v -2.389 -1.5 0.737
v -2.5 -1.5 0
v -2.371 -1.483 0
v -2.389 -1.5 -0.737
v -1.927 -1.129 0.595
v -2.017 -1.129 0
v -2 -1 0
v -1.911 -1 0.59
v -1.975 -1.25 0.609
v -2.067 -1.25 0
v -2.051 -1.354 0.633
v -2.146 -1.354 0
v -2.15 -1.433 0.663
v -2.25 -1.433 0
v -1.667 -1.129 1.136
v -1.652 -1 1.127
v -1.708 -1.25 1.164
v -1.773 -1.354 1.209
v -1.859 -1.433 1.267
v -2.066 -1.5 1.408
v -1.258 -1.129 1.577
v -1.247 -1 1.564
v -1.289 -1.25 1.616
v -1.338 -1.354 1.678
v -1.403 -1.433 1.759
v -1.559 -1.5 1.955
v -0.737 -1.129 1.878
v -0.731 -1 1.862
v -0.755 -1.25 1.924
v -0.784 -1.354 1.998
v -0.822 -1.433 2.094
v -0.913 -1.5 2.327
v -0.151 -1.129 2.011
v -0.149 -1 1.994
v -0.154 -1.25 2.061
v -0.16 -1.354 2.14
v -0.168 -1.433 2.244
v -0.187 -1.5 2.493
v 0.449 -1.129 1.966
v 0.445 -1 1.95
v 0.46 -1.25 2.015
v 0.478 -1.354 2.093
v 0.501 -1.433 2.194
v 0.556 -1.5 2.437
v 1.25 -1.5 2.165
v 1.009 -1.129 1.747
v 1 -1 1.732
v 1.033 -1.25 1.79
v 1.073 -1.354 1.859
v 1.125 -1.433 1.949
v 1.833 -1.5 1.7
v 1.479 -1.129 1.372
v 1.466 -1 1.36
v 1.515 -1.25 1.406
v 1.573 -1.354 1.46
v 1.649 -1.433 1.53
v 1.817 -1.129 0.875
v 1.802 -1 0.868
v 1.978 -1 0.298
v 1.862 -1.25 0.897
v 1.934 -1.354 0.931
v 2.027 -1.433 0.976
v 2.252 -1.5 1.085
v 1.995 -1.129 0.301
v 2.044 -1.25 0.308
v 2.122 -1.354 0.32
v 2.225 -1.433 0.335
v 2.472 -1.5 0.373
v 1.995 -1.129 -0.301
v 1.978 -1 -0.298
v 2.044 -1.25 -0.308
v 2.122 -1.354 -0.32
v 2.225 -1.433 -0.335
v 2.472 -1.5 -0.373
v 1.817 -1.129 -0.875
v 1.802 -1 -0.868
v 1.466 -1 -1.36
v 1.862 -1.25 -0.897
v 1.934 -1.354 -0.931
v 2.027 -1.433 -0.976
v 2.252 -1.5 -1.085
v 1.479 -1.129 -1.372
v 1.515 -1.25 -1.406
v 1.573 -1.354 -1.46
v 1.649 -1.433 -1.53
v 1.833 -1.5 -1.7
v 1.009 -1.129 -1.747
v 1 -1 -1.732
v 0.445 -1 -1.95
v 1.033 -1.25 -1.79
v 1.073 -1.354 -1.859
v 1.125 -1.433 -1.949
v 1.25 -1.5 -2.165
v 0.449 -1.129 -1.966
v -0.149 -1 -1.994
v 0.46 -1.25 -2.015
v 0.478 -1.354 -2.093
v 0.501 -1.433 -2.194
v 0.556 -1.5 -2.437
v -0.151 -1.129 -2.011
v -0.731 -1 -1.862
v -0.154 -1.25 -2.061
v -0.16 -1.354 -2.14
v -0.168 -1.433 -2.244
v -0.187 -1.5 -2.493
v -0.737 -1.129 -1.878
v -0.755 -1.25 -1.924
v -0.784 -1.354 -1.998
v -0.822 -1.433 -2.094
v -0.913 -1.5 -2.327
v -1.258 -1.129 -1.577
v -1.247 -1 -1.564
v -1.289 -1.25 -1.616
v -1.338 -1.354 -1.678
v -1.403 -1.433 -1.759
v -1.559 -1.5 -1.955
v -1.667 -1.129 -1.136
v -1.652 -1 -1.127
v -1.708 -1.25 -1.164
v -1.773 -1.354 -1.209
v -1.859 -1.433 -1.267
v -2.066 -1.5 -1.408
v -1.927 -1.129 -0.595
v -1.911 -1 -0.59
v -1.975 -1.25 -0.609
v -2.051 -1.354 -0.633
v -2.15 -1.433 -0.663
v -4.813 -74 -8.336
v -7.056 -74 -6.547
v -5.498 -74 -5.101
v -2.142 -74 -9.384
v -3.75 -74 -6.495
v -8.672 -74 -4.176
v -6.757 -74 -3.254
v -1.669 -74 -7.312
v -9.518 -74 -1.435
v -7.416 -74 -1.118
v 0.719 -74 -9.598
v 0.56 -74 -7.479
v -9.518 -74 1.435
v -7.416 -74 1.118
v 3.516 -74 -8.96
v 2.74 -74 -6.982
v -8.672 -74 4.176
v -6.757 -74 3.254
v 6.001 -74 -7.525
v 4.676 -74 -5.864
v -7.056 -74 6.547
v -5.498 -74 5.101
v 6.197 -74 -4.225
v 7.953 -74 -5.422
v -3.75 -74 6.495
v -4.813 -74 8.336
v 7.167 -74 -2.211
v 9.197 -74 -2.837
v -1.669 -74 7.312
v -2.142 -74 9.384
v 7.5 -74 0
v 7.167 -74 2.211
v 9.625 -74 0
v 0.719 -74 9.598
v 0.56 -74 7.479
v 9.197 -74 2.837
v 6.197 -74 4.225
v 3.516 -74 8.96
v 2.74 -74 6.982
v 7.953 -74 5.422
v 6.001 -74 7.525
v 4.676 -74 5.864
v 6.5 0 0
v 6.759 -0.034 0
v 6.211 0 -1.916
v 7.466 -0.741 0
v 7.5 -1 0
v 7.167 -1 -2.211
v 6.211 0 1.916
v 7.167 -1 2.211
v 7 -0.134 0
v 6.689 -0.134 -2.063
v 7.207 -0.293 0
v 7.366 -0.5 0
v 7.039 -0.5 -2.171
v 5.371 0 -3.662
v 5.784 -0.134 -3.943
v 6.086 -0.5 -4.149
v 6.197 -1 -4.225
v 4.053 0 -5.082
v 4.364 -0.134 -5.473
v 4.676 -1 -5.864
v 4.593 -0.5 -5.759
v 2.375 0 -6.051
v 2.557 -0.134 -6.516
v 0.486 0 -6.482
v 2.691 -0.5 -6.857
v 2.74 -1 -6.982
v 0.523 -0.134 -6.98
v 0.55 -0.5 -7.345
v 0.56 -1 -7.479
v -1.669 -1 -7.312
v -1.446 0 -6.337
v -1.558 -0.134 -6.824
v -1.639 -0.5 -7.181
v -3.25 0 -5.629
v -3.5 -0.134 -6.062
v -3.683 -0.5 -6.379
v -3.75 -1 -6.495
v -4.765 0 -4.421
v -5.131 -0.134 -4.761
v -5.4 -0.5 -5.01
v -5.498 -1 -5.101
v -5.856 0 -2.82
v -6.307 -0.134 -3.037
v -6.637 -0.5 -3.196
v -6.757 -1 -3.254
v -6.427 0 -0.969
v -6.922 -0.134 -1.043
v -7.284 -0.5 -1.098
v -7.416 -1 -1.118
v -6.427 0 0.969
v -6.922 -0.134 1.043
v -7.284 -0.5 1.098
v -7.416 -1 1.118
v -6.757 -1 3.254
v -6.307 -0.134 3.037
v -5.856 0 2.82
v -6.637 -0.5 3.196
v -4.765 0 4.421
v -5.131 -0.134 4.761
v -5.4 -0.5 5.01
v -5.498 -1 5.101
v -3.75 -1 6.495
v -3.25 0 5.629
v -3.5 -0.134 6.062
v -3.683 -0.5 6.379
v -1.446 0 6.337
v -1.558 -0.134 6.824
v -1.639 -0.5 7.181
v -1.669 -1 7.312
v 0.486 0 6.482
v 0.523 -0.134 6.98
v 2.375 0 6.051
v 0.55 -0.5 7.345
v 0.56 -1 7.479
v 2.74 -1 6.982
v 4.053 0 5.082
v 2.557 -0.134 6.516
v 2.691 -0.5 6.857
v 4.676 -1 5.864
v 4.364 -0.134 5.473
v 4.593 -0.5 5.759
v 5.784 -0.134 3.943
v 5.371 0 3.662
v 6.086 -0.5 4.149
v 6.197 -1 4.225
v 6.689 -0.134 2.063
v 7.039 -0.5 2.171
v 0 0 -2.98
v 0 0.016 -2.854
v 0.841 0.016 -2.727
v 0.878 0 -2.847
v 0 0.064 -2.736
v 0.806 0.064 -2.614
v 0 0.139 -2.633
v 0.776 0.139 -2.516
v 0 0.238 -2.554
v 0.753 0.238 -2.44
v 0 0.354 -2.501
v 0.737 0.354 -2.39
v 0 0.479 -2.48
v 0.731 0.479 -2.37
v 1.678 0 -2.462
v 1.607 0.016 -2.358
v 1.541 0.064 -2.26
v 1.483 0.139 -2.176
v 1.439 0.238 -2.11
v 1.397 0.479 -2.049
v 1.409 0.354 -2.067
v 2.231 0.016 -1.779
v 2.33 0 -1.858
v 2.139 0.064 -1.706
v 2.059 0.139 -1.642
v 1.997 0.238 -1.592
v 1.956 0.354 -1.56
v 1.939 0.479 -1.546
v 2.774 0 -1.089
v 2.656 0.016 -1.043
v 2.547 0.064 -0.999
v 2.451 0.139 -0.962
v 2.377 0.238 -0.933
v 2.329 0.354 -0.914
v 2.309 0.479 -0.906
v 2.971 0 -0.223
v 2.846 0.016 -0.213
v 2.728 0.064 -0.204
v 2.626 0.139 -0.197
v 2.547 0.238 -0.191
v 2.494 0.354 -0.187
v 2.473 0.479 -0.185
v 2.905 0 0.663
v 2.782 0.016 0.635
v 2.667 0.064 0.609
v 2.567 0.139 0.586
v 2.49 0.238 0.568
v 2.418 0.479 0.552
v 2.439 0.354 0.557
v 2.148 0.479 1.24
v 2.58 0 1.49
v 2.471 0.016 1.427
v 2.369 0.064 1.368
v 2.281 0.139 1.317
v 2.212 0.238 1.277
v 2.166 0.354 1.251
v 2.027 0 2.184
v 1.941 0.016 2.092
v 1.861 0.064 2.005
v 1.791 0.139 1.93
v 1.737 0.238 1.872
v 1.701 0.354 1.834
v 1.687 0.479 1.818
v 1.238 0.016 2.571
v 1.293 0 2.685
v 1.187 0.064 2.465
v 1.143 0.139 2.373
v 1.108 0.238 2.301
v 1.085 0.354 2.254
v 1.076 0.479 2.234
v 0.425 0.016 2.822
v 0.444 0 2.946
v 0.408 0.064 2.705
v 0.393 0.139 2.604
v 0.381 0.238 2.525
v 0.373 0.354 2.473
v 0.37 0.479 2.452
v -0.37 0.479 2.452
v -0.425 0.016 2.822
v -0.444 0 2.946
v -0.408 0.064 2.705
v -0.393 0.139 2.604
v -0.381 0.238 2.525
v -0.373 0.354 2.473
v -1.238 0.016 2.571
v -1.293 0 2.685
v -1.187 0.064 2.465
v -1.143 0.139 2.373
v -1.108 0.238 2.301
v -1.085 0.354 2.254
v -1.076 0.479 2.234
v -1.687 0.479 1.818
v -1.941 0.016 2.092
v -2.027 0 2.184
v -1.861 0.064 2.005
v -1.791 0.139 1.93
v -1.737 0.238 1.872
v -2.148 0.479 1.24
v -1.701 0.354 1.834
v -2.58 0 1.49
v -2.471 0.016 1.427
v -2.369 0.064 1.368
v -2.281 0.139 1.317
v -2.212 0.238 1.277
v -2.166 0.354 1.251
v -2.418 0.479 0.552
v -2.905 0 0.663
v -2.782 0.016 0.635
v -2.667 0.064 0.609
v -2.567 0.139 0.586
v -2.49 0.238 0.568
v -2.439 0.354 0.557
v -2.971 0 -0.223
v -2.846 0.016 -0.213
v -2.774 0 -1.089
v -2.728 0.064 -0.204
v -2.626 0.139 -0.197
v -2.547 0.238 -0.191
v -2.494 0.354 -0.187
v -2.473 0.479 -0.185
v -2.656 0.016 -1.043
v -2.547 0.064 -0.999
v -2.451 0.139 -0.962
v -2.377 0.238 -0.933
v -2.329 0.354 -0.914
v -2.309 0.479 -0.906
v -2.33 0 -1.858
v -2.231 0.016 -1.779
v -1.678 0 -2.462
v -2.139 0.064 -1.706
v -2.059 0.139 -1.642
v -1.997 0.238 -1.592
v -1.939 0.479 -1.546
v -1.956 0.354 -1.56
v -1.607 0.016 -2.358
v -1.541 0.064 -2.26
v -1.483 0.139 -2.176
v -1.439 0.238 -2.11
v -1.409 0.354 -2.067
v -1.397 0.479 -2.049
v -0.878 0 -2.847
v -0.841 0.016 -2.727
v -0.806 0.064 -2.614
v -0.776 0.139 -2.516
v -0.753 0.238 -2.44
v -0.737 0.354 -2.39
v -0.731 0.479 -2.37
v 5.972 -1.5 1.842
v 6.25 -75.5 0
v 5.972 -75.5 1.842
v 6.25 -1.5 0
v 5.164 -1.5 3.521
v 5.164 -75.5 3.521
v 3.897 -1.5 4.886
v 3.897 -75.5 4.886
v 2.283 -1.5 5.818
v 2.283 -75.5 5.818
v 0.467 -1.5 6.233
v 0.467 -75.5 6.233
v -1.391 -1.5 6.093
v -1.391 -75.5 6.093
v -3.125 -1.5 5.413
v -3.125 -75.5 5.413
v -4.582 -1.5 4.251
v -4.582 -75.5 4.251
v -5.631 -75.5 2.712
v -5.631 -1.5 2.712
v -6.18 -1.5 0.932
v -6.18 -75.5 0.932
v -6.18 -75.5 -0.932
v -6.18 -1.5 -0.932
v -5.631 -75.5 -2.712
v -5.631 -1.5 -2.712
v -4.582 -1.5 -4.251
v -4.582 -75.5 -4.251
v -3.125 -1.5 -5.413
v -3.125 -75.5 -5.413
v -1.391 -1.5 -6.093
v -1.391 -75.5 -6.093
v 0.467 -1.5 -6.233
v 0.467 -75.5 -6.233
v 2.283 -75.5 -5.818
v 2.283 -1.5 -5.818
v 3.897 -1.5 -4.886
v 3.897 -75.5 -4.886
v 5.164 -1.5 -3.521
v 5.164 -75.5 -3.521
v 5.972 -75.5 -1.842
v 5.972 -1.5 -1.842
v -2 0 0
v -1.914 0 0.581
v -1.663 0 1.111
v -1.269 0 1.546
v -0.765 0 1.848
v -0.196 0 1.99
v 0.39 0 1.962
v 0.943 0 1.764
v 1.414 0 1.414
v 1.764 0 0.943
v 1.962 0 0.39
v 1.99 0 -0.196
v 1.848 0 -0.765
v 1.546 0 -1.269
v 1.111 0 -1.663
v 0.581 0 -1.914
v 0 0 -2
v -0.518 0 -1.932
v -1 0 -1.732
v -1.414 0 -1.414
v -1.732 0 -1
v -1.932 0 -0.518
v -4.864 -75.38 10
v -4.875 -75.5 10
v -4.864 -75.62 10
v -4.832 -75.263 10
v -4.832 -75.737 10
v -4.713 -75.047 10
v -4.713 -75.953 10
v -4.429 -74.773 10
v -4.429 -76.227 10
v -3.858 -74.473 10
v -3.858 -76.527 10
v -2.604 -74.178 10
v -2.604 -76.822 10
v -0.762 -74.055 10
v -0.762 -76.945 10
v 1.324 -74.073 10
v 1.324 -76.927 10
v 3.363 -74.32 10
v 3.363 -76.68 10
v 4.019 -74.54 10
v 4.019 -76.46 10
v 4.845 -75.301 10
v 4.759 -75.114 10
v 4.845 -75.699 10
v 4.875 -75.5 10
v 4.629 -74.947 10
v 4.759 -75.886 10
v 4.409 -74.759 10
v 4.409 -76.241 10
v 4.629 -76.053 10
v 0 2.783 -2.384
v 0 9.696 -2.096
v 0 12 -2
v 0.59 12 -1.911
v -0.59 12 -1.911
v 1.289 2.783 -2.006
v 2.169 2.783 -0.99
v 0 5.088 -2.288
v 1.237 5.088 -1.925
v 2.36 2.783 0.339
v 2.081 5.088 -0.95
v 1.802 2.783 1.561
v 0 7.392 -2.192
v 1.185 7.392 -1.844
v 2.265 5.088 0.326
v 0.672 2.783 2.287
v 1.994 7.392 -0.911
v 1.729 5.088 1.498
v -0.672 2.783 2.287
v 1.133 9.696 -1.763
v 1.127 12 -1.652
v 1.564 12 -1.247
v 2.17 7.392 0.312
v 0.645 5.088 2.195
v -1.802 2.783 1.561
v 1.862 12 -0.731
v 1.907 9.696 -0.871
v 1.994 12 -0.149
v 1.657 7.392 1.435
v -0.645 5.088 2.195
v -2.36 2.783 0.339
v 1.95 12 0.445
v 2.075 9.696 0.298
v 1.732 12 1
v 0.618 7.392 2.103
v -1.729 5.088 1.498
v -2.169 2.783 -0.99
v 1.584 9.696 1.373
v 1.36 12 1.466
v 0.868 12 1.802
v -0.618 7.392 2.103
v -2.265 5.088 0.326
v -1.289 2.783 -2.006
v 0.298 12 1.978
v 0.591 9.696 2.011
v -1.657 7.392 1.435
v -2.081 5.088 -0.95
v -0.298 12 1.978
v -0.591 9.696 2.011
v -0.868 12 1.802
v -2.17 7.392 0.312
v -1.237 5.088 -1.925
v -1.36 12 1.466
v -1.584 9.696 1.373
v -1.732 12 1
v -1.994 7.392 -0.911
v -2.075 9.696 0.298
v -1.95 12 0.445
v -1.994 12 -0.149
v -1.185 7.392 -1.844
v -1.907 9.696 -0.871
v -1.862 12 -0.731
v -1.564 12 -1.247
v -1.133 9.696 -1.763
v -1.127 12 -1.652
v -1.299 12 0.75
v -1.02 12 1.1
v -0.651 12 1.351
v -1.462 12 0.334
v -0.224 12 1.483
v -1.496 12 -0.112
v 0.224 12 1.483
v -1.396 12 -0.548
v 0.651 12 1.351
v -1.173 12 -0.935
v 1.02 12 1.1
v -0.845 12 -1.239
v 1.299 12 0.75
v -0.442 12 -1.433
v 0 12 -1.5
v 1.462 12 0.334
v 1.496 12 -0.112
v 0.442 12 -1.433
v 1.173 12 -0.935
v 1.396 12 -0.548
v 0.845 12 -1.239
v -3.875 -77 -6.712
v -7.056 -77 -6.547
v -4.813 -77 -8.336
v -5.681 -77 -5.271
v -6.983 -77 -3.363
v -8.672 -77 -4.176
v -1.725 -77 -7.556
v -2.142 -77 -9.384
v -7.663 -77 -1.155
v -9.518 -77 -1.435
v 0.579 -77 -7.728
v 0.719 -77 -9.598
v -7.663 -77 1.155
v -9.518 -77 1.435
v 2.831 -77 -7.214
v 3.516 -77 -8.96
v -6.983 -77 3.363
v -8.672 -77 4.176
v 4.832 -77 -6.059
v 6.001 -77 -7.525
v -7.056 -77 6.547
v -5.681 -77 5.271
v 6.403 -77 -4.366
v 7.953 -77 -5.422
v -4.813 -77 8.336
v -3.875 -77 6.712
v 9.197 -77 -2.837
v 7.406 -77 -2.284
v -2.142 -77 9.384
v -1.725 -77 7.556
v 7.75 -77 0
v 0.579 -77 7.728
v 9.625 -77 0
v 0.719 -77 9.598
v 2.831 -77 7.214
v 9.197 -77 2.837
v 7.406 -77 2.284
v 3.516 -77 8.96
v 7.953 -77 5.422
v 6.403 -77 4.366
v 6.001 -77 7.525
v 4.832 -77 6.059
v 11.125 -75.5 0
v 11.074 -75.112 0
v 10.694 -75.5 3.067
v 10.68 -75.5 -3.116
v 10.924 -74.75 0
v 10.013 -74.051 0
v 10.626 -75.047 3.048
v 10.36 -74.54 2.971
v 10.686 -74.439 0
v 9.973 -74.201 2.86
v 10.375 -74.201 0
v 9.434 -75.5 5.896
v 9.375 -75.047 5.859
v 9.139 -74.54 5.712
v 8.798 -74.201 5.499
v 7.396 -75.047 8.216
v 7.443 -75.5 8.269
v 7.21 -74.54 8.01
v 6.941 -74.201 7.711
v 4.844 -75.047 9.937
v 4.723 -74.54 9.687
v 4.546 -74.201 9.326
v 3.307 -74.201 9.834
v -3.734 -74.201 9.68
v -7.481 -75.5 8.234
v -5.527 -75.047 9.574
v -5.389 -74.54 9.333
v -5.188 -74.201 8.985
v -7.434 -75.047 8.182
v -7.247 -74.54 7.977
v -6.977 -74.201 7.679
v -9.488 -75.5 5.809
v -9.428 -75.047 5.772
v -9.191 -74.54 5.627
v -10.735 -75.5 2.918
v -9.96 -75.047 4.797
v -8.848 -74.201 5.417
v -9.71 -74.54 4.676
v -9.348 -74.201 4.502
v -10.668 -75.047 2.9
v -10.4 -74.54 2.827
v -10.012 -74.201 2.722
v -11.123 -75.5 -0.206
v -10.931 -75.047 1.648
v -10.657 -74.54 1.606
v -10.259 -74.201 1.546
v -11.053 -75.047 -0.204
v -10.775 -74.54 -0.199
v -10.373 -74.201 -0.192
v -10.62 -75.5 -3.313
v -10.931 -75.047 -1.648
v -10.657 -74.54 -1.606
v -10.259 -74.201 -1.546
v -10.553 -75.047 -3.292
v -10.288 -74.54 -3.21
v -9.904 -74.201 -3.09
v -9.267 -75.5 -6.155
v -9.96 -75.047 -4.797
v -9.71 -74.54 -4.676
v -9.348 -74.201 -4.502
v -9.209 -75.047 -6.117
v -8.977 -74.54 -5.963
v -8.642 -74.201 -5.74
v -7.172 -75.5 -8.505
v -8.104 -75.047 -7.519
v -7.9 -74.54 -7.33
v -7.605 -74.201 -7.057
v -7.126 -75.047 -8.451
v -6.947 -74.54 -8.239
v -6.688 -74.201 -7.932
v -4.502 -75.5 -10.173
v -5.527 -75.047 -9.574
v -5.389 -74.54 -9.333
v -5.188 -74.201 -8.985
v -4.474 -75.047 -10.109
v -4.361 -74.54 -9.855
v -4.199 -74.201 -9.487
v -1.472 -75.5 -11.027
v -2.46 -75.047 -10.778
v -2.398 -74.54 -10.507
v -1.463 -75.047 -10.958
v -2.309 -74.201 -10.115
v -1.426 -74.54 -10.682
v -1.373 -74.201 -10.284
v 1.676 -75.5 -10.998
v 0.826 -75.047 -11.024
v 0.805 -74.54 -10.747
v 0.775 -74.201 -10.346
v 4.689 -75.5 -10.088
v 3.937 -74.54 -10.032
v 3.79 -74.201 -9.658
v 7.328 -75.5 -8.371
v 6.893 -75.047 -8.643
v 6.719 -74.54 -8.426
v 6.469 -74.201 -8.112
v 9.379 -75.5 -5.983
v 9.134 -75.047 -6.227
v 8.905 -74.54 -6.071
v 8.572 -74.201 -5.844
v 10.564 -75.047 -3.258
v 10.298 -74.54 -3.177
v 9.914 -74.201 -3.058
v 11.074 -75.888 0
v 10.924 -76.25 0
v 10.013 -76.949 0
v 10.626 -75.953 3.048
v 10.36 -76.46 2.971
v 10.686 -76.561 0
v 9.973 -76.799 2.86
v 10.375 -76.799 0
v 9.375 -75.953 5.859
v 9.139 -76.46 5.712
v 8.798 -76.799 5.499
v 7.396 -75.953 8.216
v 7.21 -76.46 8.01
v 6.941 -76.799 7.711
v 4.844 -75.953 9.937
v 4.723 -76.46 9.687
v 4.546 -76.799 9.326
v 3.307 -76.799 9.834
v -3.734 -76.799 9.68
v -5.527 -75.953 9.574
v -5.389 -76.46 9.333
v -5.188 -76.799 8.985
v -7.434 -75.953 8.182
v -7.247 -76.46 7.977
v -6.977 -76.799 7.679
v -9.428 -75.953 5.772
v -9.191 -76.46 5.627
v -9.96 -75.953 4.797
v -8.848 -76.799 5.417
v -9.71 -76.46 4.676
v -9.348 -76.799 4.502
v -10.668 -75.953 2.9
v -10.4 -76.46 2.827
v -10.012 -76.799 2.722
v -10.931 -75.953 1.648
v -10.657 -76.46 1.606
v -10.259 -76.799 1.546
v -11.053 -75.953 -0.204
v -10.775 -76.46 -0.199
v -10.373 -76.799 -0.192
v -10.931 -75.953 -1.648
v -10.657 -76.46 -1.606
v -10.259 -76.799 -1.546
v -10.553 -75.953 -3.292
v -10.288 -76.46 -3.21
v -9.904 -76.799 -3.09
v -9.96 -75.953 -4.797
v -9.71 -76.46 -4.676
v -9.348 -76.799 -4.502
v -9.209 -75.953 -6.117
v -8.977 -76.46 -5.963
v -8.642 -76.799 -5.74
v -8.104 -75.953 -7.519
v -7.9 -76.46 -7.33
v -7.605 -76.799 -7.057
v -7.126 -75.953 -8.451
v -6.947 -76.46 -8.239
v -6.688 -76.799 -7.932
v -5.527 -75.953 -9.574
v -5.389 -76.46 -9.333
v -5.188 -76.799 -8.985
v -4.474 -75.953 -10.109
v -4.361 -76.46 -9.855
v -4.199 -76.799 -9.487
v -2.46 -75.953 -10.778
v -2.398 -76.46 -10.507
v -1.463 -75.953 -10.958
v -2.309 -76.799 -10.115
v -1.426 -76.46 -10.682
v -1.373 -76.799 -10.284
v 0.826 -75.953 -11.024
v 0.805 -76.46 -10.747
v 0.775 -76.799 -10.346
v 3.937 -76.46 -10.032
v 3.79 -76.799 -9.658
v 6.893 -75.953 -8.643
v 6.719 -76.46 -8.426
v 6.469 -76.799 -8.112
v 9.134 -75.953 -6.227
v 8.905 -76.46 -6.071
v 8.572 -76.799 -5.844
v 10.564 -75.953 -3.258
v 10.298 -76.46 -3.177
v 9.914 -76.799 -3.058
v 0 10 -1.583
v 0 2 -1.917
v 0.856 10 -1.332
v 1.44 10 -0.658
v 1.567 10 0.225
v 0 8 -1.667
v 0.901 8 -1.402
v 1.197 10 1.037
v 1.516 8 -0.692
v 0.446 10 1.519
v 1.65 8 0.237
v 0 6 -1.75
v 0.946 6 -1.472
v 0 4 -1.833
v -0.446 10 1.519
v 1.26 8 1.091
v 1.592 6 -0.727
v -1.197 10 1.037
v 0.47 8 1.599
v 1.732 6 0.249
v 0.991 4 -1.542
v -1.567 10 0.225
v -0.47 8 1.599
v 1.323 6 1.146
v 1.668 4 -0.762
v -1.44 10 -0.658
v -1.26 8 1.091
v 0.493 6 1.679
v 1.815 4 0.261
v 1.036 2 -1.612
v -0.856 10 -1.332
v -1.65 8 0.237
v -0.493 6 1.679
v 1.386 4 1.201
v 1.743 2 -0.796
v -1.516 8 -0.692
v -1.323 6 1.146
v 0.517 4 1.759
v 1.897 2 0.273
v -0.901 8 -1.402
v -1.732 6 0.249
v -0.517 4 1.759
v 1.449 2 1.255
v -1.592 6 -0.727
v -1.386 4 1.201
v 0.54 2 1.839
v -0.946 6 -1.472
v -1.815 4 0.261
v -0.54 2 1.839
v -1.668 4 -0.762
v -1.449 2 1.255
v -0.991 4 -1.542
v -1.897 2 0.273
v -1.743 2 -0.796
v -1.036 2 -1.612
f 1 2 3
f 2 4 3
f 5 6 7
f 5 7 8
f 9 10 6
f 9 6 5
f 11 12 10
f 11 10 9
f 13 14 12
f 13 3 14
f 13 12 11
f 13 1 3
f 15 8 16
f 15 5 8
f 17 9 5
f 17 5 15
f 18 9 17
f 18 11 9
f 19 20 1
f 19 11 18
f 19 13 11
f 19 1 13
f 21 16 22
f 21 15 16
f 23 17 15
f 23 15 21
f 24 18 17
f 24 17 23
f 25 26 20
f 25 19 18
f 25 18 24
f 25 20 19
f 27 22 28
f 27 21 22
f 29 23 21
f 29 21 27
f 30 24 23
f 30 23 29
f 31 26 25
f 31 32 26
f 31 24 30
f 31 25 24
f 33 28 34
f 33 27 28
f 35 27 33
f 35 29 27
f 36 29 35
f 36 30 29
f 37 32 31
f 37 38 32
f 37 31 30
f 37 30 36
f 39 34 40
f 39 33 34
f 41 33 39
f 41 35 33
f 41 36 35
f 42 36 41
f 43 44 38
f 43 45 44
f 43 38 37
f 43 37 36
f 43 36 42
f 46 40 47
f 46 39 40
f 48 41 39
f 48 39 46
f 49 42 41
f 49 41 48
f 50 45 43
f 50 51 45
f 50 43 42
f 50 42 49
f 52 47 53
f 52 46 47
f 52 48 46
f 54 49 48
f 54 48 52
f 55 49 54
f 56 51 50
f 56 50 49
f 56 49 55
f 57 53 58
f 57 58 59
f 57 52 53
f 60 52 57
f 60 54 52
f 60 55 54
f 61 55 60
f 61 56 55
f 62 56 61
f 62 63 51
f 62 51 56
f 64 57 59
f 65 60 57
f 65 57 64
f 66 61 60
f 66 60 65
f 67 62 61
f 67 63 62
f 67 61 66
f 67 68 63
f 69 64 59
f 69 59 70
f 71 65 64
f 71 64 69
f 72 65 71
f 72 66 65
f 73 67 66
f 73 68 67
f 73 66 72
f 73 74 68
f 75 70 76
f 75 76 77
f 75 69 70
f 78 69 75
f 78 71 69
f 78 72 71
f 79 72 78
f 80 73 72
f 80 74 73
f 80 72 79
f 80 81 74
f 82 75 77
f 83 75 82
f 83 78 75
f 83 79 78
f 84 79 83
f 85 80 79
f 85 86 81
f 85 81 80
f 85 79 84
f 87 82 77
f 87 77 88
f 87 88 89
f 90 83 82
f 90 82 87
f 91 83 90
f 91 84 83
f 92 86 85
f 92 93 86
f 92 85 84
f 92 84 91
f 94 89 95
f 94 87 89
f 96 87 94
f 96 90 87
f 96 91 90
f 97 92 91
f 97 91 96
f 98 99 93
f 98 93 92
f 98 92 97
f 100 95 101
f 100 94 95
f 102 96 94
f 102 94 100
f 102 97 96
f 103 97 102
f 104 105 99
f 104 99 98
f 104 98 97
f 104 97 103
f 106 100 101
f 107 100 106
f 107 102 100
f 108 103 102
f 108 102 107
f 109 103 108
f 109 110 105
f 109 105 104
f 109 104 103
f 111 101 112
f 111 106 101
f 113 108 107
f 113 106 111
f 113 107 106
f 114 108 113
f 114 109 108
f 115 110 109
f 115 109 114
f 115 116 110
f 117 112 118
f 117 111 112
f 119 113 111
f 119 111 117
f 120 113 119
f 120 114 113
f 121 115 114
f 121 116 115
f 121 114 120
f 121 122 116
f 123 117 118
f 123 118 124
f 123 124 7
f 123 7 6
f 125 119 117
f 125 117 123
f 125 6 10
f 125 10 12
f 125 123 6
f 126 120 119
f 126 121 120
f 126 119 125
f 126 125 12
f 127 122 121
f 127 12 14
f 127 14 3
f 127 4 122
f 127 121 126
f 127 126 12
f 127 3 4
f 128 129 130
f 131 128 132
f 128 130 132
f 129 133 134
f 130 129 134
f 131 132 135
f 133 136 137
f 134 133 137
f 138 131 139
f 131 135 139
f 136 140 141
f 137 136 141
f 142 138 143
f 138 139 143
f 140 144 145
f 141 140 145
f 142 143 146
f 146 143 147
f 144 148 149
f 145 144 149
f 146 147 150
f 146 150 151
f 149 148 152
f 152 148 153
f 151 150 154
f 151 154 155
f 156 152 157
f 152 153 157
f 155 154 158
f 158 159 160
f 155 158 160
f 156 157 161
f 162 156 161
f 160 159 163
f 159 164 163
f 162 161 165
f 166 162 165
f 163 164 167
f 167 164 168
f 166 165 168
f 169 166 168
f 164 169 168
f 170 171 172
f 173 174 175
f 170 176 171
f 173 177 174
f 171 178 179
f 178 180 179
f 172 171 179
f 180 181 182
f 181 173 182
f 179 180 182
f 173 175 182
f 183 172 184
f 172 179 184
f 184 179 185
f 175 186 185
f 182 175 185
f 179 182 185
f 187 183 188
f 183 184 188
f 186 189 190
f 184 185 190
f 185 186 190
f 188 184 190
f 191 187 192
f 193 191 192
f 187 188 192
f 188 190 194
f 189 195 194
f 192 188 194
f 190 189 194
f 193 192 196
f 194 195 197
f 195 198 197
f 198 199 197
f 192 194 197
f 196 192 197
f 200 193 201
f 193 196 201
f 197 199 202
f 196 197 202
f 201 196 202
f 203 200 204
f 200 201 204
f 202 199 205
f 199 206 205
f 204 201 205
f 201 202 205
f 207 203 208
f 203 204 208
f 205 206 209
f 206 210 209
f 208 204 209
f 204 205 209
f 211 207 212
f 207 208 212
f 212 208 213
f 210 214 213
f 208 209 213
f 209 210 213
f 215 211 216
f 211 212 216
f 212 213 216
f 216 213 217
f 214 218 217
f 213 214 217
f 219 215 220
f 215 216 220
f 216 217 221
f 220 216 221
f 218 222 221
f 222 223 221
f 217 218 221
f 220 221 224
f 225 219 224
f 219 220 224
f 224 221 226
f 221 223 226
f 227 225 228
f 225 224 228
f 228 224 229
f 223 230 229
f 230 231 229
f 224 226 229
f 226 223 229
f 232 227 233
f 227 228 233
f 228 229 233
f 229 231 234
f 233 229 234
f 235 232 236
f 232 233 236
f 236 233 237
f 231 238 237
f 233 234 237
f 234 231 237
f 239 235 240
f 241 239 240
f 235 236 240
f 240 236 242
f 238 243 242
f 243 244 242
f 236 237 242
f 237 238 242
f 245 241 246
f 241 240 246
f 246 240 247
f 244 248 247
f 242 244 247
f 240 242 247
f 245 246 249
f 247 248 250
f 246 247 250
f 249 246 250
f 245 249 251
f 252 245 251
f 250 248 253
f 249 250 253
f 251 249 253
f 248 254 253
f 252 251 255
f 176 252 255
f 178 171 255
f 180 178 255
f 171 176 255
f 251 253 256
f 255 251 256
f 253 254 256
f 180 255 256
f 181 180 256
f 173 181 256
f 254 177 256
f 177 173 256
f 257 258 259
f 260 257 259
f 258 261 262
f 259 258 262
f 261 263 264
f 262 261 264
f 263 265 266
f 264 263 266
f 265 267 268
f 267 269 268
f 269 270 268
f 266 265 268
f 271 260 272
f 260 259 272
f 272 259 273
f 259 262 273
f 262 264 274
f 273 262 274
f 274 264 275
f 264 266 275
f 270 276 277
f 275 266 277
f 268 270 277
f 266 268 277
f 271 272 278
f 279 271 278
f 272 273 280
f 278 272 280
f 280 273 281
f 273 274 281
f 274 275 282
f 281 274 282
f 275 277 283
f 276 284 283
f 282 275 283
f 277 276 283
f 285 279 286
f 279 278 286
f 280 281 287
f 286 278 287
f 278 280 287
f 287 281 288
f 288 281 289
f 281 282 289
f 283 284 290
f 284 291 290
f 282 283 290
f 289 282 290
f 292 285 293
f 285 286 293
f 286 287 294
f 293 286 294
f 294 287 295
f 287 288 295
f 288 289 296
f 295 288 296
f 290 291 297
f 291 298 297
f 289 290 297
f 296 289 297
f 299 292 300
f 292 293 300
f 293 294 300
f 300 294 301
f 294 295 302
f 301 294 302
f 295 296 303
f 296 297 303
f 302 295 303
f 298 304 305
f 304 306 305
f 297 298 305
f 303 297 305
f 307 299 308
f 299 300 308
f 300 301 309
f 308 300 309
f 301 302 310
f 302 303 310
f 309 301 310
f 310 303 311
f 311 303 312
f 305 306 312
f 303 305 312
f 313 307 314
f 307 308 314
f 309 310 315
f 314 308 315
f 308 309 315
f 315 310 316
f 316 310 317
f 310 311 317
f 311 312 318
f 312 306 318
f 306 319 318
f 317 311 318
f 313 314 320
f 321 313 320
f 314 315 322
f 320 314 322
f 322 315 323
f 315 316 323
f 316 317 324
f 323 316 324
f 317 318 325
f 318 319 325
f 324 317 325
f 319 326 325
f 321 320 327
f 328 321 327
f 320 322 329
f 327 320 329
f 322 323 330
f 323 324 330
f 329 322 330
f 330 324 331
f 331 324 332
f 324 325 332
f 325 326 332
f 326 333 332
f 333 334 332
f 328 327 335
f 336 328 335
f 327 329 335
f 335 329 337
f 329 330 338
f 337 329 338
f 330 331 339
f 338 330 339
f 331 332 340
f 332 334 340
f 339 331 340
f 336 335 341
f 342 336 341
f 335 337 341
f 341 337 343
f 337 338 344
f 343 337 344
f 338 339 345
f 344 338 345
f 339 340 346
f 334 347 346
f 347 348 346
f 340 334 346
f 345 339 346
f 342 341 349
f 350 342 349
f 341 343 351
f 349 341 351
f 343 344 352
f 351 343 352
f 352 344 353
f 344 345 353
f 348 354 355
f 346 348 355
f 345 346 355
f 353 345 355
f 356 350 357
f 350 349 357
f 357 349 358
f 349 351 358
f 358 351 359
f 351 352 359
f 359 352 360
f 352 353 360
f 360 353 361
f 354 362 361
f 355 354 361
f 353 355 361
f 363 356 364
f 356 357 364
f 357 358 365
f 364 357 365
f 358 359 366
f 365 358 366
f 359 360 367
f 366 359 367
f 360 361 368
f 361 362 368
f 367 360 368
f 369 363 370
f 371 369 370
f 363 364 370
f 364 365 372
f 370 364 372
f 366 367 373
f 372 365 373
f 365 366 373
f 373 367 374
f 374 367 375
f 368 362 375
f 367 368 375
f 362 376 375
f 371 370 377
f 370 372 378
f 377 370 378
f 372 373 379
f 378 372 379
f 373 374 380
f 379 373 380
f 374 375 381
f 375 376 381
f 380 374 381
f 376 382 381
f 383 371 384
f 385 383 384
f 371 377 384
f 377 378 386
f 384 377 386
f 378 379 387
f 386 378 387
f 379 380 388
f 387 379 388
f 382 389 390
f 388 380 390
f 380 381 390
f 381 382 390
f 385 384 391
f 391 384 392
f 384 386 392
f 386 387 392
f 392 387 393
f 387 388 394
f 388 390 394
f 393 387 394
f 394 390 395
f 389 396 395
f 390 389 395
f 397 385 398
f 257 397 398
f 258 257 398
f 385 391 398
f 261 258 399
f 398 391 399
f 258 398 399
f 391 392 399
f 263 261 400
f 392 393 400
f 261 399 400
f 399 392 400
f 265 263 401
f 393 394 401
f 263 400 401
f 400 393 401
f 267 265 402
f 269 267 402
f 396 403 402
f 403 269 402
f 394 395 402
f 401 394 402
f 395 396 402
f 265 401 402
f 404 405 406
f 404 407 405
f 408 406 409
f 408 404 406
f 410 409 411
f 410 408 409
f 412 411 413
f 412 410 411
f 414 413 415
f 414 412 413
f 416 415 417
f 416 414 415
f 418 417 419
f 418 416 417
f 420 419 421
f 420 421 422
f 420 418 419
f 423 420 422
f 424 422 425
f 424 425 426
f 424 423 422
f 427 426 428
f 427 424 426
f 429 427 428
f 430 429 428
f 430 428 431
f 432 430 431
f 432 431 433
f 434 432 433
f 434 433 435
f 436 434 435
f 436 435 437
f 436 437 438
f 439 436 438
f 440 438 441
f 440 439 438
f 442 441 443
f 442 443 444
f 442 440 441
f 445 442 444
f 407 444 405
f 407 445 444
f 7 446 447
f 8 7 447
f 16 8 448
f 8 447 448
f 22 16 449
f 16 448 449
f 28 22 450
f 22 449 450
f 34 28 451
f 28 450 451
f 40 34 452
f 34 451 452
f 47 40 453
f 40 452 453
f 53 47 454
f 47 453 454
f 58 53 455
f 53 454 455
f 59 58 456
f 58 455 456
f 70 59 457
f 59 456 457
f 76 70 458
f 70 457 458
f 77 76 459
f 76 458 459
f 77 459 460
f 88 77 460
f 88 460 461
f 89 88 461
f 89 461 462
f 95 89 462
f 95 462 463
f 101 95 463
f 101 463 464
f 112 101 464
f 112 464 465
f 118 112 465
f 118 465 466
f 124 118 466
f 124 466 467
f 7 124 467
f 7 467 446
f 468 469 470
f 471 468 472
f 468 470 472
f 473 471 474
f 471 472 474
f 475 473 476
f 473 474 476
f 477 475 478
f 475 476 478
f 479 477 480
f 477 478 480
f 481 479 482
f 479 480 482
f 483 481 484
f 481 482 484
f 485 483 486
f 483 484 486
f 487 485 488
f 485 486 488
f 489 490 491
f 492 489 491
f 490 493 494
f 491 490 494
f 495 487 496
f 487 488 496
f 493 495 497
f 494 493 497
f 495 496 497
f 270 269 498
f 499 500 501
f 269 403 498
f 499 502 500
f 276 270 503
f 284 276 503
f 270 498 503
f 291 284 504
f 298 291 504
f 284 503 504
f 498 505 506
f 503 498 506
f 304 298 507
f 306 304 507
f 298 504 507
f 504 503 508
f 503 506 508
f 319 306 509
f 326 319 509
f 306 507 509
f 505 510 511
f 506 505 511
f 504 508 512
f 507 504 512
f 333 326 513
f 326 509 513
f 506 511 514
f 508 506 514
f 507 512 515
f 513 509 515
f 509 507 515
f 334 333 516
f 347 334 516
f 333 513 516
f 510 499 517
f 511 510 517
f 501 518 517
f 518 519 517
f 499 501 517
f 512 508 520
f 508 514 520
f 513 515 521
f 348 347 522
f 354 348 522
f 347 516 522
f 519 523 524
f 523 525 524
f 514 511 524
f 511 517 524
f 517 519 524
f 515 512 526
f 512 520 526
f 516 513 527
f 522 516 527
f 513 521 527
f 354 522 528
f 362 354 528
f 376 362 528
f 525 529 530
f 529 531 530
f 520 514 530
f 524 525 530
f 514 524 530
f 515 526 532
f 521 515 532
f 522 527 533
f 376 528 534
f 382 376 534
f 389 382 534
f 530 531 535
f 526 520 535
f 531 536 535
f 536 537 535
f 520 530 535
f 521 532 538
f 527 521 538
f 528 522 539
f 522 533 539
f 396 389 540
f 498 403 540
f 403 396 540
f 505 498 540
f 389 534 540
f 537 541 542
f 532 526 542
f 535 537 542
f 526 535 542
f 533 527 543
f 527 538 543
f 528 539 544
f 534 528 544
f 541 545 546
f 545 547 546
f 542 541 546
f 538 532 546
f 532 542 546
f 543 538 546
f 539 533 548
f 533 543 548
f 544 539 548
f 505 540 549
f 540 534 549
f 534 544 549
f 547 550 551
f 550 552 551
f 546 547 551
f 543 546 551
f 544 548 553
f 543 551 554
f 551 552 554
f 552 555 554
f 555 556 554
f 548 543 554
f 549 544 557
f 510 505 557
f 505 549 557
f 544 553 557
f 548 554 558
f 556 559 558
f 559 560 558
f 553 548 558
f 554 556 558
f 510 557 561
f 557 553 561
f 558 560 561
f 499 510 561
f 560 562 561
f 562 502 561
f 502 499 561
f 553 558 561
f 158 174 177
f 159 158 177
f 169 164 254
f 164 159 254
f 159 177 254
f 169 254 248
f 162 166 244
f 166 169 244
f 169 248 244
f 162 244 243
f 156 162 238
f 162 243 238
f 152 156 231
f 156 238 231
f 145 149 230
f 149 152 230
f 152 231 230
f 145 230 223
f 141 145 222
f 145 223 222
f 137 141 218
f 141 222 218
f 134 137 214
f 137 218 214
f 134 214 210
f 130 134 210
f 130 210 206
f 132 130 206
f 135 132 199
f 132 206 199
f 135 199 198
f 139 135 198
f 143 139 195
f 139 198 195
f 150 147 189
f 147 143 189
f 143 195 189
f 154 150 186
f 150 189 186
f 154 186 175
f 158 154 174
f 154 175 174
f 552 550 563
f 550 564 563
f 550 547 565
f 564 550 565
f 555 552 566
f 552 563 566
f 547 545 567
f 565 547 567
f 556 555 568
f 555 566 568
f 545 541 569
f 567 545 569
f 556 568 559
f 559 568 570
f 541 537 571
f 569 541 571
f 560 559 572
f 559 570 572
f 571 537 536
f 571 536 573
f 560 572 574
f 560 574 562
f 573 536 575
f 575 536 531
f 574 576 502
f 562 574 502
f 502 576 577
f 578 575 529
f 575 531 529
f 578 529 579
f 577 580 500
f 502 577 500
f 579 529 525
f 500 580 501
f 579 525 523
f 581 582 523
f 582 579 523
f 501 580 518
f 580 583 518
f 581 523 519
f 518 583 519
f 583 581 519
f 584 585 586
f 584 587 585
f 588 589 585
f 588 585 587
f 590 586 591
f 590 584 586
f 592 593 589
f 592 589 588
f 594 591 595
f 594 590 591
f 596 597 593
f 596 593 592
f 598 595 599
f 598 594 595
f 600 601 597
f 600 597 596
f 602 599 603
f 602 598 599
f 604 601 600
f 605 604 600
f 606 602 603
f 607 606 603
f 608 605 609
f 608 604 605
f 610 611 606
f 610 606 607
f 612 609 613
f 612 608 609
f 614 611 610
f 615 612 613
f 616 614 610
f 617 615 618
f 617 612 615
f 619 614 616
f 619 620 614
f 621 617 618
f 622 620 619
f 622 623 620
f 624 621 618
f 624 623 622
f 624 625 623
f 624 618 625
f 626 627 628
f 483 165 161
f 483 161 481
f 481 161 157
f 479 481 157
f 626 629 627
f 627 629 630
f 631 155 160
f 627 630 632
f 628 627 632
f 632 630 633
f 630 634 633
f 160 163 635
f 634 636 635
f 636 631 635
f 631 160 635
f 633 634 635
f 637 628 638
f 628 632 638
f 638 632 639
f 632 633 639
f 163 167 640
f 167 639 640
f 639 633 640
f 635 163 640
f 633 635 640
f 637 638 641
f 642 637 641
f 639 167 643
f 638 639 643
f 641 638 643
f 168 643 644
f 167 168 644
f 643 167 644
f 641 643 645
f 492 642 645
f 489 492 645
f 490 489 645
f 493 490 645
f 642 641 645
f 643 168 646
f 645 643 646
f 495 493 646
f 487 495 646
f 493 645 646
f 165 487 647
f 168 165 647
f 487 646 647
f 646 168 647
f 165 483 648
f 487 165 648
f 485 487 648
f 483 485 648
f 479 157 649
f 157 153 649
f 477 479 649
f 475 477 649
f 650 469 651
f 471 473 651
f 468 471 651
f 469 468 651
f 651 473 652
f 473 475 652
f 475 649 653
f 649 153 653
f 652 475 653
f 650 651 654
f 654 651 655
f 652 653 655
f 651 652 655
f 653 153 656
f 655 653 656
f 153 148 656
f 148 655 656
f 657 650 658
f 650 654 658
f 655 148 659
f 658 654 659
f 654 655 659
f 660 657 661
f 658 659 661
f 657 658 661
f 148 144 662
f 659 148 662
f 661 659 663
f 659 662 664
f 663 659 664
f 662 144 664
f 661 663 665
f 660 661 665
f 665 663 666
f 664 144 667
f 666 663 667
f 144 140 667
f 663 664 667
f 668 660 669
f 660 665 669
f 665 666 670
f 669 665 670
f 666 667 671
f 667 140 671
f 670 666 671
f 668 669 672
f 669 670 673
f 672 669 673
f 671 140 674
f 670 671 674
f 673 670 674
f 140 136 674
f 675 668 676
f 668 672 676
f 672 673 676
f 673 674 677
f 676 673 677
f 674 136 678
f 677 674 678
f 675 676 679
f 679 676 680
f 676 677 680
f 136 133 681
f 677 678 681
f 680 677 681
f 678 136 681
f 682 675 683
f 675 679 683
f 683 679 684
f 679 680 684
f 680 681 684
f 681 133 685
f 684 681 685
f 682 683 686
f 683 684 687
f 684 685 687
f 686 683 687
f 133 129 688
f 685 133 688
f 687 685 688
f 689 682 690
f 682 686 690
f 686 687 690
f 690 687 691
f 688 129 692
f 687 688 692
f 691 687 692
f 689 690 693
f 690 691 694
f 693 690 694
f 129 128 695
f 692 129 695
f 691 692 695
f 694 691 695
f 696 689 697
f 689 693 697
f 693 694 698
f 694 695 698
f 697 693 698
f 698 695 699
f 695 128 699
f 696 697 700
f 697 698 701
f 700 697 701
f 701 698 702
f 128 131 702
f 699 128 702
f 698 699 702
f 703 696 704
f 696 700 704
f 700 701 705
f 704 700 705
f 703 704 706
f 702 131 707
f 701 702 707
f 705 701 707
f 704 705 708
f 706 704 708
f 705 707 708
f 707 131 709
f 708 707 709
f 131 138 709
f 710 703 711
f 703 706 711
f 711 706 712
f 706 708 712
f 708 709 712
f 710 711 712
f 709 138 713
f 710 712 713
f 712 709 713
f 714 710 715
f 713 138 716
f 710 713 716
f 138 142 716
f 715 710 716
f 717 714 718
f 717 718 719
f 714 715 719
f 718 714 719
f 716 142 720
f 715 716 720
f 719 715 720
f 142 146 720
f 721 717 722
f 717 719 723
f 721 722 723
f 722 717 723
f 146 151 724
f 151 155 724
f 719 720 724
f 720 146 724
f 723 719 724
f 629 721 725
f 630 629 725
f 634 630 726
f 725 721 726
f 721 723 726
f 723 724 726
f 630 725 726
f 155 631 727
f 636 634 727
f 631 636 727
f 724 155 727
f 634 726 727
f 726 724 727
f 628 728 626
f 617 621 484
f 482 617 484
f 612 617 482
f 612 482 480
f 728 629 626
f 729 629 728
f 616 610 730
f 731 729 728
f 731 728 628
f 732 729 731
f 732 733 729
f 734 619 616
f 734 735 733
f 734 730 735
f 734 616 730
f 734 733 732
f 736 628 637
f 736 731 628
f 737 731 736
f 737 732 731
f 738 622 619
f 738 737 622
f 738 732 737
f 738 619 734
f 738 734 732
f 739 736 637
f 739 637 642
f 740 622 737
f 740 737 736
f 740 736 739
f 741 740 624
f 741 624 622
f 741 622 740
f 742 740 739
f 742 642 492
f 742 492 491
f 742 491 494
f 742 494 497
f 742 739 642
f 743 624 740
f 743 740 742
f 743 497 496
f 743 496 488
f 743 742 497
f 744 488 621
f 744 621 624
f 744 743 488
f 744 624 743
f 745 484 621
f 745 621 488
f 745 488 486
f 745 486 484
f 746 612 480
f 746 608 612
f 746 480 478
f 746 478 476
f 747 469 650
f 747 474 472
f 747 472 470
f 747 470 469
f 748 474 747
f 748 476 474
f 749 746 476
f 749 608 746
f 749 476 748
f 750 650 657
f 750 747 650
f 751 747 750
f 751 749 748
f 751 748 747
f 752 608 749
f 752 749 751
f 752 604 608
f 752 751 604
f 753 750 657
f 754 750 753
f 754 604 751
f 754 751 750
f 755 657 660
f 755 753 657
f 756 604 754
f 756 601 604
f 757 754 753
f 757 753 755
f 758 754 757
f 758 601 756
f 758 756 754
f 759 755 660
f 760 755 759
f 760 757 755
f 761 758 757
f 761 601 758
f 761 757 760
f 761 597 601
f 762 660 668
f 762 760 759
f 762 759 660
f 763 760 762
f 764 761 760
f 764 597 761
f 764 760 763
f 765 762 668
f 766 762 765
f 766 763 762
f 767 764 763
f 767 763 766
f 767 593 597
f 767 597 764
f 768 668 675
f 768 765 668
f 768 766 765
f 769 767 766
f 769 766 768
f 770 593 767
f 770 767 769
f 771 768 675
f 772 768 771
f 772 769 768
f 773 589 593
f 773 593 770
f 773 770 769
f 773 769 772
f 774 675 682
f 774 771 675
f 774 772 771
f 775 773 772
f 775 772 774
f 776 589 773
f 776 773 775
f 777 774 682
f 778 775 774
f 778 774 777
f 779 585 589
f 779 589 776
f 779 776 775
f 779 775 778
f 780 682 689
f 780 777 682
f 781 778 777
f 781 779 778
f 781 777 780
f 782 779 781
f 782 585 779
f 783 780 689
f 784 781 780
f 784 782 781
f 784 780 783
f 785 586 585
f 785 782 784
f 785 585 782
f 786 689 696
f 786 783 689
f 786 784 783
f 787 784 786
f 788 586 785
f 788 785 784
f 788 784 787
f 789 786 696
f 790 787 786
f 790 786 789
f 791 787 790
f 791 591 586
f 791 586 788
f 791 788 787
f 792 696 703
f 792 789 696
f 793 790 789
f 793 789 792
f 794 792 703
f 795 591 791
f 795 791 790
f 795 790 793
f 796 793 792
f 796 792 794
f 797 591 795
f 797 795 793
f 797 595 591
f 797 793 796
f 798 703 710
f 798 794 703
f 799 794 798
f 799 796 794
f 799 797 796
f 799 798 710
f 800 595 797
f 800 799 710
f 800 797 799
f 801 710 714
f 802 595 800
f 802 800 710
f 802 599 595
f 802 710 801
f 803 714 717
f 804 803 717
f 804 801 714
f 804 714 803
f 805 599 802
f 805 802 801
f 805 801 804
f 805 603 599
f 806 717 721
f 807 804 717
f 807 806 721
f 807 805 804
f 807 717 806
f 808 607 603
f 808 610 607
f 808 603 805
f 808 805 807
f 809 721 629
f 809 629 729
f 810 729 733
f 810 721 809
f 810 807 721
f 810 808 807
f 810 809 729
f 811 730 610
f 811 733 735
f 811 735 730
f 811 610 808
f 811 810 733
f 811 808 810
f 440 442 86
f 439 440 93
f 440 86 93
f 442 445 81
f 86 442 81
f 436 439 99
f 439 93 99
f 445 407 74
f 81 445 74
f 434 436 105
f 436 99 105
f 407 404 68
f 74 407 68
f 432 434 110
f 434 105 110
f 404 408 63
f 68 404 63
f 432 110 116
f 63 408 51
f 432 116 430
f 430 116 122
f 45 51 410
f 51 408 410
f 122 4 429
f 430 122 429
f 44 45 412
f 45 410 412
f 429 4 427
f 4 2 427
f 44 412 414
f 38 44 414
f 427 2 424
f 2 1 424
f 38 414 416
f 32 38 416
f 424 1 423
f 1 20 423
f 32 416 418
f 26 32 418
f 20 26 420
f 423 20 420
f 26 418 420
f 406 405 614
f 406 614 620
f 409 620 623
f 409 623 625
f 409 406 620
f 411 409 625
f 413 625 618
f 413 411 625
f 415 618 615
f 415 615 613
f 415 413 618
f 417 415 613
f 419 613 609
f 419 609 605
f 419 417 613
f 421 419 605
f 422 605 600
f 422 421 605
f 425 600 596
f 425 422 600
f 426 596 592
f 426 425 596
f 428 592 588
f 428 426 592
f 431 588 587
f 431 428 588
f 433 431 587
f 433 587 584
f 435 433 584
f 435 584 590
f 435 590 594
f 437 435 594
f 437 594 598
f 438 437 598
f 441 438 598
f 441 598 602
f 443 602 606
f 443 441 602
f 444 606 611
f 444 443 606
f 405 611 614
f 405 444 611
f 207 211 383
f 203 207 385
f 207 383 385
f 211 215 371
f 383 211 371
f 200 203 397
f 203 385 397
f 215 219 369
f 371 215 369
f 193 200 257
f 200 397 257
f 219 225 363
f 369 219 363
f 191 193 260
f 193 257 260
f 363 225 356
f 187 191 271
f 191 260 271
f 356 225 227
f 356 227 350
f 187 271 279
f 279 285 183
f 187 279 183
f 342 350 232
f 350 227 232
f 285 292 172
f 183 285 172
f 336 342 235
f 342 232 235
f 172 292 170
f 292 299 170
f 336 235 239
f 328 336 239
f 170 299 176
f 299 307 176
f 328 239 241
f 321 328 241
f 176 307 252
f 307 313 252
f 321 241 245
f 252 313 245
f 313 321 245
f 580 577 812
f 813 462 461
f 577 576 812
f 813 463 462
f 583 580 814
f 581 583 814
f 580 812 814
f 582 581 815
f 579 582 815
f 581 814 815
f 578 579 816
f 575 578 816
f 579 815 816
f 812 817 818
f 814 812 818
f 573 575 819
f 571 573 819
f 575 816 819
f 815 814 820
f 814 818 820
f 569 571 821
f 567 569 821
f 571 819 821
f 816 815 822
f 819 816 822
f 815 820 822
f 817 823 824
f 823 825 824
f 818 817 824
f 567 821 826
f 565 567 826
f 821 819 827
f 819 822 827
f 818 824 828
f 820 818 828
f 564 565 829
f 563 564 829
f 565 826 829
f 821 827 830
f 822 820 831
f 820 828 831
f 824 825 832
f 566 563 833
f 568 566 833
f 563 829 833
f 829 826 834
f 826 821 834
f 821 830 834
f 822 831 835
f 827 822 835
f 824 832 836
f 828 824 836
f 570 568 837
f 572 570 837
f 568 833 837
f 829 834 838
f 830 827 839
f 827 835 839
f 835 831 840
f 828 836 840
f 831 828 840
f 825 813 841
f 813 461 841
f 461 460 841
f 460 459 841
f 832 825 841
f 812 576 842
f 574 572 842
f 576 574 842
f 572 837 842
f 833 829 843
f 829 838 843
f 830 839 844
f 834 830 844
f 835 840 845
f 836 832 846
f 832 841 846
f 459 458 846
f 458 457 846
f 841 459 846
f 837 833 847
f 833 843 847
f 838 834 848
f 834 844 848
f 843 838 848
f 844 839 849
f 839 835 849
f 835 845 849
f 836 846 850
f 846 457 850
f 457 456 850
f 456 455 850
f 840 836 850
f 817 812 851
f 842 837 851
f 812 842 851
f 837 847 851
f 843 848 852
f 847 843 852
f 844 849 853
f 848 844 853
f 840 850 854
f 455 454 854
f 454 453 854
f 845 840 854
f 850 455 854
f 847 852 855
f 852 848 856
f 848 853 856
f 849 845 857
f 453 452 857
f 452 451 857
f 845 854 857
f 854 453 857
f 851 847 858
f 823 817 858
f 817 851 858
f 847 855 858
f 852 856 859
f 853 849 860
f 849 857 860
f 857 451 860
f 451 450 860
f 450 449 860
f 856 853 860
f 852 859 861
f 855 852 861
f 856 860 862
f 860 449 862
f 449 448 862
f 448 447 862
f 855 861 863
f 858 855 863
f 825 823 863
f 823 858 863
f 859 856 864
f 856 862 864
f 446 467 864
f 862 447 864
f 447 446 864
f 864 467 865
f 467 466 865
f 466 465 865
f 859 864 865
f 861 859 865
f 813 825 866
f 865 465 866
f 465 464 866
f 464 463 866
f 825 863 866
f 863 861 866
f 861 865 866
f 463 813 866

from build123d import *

# Parameters (mm, degrees)
F0_R      = 7.5
F0_R_2    = 6.25
F1_DEPTH  = 77
F2_R      = 11.125
F2_R_2    = 7.5
F2_R_3    = 6.25
F3_DEPTH  = 3
F4_R      = 1.49999
F6_DEPTH  = 25
F7_SIZE   = 1.5
F8_R      = 7.5
F9_DEPTH  = 1.5
F10_R     = 1
F13_R     = 0.5
F14_R     = 2
F15_DEPTH = 25
F16_R     = 0.5


# Not quite as in the source:
# - a fillet or chamfer is up to 0.001 mm smaller than in the source, because OpenCascade refuses the exact size


with BuildPart() as f1:
    # F0 (on Front) → F1 (new body)
    with BuildSketch(Plane.XZ):
        Circle(F0_R)
        Circle(F0_R_2, mode=Mode.SUBTRACT)
    extrude(amount=F1_DEPTH)

    # F2 (on face) → F3 (join)
    with BuildSketch(Plane.XZ.offset(77)):
        Circle(F2_R)
        Circle(F2_R_2, mode=Mode.SUBTRACT)
        Circle(F2_R_2)
        Circle(F2_R_3, mode=Mode.SUBTRACT)
    extrude(amount=-F3_DEPTH)

    # F4 (radius 1.5 in the source; OpenCascade refuses exactly that, so slightly less here)
    f4_edges = [f1.edges().sort_by_distance(p)[0] for p in [
        (-11.125, -77, 0),
        (-11.125, -74, 0),
    ]]
    fillet(f4_edges, radius=F4_R)

    # F5 (on face) → F6 (cut)
    with BuildSketch(Plane.XZ.offset(77)):
        Polygon((-7.5801494531, 15.4223963618), (-10.2109283504, 10), (17.5064372194, 10), (14.5523855463, 16.5495146066), align=None)
    extrude(amount=-F6_DEPTH, mode=Mode.SUBTRACT)

    # F7
    f7_edges = [f1.edges().sort_by_distance(p)[0] for p in [
        (-6.25, -77, 0),
    ]]
    chamfer(f7_edges, length=F7_SIZE)

    # F8 (on face) → F9 (join)
    with BuildSketch(Plane(origin=(0, 0, 0), x_dir=(-1, 0, 0), z_dir=(0, 1, 0))):
        Circle(F8_R)
    extrude(amount=-F9_DEPTH)

    # F10
    f10_edges = [f1.edges().sort_by_distance(p)[0] for p in [
        (-7.5, 0, 0),
    ]]
    fillet(f10_edges, radius=F10_R)

    # F11 (on Right) → F12 (revolve)
    with BuildSketch(Plane.YZ):
        Polygon((0, -2), (0, -2.5), (12, -2), (12, -1.5), align=None)
    revolve(axis=Axis((0, 5.0854310393, 0), (0, -1, 0)))

    # F13
    f13_edges = [f1.edges().sort_by_distance(p)[0] for p in [
        (0, 0, 2.5),
    ]]
    fillet(f13_edges, radius=F13_R)

    # F14 (on face) → F15 (cut)
    with BuildSketch(Plane(origin=(0, 0, 0), x_dir=(-1, 0, 0), z_dir=(0, 1, 0))):
        Circle(F14_R)
    extrude(amount=-F15_DEPTH, mode=Mode.SUBTRACT)

    # F16
    f16_edges = [f1.edges().sort_by_distance(p)[0] for p in [
        (2, -1.5, 0),
    ]]
    fillet(f16_edges, radius=F16_R)


solid = f1.part
